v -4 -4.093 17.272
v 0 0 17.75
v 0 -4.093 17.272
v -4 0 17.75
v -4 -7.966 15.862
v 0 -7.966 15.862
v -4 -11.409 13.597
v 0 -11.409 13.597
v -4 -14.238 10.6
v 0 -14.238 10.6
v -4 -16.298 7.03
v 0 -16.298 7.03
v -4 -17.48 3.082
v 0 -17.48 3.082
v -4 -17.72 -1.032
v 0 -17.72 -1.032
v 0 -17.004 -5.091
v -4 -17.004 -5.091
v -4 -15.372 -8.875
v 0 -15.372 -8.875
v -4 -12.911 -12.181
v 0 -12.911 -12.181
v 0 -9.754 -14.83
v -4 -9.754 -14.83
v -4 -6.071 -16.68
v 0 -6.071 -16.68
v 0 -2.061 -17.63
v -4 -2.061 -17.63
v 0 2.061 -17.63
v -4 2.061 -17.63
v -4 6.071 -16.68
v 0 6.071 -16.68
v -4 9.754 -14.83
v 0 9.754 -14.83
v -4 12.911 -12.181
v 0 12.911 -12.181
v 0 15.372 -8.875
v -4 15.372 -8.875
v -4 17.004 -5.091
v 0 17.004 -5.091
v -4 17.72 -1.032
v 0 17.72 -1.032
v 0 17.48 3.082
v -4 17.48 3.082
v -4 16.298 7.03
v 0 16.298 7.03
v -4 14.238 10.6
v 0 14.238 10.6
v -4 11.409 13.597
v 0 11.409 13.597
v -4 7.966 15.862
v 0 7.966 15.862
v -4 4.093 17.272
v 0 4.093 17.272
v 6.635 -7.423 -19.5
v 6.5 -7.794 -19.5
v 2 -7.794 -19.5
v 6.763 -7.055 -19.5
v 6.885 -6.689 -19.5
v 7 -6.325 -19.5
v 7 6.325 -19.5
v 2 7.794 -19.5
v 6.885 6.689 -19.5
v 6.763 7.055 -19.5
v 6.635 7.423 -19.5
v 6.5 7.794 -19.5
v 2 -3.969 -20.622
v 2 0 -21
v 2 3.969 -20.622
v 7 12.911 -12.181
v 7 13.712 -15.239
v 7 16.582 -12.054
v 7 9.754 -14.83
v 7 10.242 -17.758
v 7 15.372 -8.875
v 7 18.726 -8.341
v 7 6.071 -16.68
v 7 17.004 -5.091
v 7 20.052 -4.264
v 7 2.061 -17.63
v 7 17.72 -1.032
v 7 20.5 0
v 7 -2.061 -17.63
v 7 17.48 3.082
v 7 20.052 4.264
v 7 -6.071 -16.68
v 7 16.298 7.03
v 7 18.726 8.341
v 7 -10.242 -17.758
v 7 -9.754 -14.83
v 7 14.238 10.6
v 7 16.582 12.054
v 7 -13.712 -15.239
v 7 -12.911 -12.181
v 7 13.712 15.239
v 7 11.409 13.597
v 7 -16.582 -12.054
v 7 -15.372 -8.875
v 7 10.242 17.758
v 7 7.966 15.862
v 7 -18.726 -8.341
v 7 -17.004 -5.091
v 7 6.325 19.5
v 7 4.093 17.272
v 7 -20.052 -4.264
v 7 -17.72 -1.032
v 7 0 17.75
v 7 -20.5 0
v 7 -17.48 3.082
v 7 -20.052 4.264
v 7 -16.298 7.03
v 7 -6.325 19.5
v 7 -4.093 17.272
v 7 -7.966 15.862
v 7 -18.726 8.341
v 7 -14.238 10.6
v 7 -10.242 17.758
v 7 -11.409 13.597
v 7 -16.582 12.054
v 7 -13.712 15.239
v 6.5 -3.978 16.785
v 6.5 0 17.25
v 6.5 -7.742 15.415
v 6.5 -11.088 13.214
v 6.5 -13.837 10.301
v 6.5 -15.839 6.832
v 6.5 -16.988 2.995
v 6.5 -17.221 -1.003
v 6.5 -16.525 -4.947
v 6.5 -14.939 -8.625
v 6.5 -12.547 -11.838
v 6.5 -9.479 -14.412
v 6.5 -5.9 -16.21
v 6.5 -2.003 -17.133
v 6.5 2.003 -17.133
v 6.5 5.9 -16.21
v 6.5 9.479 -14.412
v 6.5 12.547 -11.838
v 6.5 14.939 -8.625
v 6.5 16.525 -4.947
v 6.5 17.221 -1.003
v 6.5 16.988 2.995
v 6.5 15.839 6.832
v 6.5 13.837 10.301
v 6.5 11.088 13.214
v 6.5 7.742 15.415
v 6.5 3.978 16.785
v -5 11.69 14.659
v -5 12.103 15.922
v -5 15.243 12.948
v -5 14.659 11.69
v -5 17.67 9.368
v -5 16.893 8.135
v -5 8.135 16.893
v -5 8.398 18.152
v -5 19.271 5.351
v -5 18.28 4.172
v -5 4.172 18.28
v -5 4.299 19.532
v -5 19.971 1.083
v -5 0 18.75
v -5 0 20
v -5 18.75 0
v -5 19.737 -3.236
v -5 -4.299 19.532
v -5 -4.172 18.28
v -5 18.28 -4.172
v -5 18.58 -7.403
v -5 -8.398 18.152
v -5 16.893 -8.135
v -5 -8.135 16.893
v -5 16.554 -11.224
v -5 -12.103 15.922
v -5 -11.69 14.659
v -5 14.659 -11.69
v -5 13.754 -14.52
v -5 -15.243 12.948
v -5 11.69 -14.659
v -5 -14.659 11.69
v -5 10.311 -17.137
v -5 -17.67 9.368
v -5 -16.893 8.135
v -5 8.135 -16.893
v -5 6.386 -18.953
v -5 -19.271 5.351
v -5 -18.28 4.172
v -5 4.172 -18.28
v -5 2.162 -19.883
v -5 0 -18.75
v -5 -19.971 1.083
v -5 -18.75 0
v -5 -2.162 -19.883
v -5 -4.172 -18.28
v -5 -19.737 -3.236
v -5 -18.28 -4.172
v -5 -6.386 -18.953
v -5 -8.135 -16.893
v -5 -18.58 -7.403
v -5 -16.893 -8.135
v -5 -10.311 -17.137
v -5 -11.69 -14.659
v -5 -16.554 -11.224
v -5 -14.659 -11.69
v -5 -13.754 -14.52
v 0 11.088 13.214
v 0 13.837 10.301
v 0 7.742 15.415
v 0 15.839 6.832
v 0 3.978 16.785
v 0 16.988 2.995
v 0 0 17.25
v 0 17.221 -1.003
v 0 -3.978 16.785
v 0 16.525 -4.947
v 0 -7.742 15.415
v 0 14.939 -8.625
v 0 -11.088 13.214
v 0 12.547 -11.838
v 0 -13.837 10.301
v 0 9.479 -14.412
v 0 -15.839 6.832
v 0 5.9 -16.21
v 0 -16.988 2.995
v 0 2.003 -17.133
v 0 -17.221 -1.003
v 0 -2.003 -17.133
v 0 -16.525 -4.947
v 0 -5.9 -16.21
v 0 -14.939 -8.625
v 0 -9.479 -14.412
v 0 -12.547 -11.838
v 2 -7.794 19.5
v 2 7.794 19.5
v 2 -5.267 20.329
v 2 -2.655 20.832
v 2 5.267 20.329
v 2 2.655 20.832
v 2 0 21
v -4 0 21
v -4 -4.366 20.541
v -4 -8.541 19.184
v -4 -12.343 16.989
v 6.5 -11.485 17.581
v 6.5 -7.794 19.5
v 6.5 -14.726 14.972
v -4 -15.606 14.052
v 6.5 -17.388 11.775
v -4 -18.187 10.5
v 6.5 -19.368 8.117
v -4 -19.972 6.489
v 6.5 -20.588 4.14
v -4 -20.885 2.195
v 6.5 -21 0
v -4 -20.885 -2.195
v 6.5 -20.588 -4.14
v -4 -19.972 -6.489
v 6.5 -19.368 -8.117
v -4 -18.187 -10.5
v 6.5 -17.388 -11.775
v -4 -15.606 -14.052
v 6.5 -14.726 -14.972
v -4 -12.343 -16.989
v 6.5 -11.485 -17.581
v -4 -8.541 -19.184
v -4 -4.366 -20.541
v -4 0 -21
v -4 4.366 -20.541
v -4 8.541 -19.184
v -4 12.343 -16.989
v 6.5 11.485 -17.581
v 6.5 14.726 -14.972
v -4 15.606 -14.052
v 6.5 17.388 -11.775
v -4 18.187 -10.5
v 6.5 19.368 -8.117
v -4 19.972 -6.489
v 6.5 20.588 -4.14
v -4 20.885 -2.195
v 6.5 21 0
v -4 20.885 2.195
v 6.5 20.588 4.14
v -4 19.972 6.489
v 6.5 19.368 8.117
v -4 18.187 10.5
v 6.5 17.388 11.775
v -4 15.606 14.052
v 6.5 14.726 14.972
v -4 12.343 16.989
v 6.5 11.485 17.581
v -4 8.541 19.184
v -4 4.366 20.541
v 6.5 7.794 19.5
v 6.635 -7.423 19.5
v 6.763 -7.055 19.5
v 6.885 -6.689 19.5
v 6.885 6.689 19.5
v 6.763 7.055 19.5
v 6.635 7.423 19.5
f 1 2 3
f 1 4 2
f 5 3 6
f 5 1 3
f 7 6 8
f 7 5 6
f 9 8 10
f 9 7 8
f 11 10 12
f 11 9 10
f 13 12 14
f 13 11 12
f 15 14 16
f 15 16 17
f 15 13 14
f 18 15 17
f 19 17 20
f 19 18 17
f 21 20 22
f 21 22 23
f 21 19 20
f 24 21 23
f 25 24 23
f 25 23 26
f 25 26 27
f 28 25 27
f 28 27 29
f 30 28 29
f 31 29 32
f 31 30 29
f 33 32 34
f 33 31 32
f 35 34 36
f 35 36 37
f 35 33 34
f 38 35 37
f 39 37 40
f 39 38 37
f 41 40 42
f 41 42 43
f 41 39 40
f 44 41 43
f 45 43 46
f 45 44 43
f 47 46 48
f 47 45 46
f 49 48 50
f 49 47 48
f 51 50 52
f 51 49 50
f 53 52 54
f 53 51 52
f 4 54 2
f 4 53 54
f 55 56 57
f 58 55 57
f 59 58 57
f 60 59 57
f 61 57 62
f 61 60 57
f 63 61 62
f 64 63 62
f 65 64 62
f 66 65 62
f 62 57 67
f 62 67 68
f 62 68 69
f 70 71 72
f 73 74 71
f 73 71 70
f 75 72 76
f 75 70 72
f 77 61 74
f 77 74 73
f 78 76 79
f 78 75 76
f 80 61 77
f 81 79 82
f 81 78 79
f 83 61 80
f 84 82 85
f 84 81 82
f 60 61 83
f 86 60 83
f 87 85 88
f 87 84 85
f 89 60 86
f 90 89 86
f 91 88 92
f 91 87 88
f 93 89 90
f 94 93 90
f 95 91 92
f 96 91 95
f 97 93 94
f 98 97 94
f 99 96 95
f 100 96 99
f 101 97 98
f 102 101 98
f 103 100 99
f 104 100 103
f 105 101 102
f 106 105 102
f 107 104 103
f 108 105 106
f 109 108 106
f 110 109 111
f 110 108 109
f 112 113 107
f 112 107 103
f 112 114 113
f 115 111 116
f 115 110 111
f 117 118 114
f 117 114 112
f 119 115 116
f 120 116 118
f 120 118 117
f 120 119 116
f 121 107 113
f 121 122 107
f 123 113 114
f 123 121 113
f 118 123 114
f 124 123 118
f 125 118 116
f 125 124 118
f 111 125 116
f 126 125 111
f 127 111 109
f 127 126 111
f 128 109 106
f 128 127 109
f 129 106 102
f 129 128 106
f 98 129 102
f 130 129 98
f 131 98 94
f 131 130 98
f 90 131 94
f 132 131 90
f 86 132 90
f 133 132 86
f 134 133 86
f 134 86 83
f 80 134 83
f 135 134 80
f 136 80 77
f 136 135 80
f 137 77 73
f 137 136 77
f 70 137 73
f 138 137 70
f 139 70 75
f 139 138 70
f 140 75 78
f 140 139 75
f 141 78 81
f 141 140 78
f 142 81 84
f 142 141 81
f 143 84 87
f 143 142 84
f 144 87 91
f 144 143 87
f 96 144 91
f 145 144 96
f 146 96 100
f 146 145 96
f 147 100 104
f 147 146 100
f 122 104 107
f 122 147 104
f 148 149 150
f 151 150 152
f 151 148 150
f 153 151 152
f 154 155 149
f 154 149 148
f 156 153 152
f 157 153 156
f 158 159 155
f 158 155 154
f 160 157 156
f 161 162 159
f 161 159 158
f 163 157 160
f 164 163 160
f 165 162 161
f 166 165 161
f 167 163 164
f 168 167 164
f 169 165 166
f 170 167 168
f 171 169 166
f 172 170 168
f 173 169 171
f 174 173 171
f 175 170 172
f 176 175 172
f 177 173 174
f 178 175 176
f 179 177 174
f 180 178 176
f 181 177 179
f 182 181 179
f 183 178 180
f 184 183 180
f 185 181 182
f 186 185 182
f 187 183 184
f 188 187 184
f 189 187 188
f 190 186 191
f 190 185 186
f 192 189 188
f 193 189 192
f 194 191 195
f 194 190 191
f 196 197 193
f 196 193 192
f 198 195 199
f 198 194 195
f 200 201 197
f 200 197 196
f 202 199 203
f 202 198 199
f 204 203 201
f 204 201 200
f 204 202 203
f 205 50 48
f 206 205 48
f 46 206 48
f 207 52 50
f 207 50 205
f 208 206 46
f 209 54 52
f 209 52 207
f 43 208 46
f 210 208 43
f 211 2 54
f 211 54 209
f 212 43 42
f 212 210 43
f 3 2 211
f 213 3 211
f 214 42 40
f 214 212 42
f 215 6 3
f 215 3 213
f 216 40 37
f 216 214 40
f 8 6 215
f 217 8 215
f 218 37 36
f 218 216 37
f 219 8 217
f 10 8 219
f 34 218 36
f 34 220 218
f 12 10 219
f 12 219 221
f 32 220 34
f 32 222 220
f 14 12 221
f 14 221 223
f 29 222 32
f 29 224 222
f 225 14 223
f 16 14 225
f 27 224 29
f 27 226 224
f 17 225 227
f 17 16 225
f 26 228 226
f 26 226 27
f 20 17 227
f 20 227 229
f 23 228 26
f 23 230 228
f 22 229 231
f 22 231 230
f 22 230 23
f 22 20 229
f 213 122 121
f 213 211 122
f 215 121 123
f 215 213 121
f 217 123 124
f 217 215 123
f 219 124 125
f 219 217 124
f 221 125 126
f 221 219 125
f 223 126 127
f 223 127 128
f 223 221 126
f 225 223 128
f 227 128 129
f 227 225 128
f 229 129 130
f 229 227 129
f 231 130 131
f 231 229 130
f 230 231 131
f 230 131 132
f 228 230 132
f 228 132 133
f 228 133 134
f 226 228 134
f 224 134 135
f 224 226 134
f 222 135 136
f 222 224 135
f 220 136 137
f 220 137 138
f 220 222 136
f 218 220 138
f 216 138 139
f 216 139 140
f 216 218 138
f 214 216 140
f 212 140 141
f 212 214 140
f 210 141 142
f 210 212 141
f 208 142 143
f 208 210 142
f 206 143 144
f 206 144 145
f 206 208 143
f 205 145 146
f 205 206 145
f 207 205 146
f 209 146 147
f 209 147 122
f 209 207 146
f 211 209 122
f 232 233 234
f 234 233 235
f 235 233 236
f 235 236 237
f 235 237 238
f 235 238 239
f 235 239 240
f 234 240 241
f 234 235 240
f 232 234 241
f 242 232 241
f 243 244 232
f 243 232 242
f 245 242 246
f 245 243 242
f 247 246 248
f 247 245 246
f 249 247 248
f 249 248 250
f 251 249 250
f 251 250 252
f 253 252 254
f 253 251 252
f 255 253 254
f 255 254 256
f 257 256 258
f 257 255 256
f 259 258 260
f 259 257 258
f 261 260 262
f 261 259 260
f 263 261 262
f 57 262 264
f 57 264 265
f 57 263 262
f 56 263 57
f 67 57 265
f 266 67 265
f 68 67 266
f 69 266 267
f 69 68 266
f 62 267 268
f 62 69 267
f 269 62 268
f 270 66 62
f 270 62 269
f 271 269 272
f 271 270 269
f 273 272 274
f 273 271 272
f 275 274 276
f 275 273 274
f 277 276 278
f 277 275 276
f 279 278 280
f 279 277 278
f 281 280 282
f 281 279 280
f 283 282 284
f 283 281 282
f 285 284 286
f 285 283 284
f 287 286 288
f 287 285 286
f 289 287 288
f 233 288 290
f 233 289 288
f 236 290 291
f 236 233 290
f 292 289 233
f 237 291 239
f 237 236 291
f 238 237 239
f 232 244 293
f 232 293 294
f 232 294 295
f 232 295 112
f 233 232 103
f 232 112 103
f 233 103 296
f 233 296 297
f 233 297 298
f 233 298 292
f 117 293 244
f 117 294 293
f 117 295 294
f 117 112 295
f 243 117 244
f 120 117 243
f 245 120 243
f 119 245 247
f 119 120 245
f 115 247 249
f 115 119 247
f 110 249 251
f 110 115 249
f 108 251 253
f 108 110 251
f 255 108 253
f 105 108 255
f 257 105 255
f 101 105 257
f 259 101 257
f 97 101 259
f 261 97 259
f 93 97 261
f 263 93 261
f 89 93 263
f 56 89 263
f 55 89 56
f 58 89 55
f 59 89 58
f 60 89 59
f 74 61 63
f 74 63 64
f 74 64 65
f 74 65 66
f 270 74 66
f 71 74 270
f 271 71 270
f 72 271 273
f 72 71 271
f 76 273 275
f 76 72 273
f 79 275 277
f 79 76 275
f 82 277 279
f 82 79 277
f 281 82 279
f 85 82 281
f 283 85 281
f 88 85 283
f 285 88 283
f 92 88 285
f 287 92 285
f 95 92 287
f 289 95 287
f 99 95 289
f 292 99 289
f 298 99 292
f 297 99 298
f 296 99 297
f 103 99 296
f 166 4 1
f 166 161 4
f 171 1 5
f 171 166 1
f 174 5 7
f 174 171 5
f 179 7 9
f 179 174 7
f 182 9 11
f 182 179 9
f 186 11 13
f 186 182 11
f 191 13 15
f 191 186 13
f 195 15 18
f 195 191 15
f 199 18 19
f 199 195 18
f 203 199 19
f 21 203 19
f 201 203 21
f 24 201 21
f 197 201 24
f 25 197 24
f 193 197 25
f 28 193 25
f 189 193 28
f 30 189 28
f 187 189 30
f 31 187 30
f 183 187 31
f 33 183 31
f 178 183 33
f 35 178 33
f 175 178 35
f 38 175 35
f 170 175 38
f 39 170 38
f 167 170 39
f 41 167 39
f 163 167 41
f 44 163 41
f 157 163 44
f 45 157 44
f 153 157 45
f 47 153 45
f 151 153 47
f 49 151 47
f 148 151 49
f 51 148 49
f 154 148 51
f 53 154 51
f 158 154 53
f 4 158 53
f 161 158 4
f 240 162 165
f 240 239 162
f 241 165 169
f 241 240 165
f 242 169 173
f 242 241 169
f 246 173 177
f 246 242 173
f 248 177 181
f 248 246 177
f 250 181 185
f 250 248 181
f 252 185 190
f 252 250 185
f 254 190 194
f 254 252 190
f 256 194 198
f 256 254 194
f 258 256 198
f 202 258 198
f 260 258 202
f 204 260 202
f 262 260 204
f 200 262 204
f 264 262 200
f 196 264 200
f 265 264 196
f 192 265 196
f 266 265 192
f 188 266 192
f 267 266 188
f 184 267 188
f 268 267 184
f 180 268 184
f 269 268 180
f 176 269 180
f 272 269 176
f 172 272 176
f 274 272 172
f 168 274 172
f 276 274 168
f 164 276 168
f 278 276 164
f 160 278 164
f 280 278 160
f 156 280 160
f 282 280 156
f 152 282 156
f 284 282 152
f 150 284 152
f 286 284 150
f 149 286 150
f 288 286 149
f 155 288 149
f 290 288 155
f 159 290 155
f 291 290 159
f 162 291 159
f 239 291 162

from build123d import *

# Parameters (mm, degrees)
ESQUISSE2_W             = 6.395173454
ESQUISSE2_H             = 30.286576169
ENL_V_MAT_EXTRU_1_DEPTH = 5


with BuildPart() as part:
    # Esquisse1 → Révolution1 (revolve)
    with BuildSketch(Plane.XY):
        Polygon((0, 17.75), (-4, 17.75), (-5, 18.75), (-5, 20), (-4, 21), (6.5, 21), (7, 20.5), (7, 17.75), (6.5, 17.25), (0, 17.25), align=None)
    revolve(axis=Axis((-33.075824176, 0, 0), (1, 0, 0)))

    # Esquisse2 → Enlèv. mat.-Extru.1 (cut)
    with BuildSketch(Plane(origin=(7, 0, 0), x_dir=(0, 0, -1), z_dir=(1, 0, 0))):
        with Locations((-22.697586727, -0.422322776)):
            Rectangle(ESQUISSE2_W, ESQUISSE2_H)
        with Locations((22.697586727, -0.422322776)):
            Rectangle(ESQUISSE2_W, ESQUISSE2_H)
    extrude(amount=-ENL_V_MAT_EXTRU_1_DEPTH, mode=Mode.SUBTRACT)


solid = part.part
